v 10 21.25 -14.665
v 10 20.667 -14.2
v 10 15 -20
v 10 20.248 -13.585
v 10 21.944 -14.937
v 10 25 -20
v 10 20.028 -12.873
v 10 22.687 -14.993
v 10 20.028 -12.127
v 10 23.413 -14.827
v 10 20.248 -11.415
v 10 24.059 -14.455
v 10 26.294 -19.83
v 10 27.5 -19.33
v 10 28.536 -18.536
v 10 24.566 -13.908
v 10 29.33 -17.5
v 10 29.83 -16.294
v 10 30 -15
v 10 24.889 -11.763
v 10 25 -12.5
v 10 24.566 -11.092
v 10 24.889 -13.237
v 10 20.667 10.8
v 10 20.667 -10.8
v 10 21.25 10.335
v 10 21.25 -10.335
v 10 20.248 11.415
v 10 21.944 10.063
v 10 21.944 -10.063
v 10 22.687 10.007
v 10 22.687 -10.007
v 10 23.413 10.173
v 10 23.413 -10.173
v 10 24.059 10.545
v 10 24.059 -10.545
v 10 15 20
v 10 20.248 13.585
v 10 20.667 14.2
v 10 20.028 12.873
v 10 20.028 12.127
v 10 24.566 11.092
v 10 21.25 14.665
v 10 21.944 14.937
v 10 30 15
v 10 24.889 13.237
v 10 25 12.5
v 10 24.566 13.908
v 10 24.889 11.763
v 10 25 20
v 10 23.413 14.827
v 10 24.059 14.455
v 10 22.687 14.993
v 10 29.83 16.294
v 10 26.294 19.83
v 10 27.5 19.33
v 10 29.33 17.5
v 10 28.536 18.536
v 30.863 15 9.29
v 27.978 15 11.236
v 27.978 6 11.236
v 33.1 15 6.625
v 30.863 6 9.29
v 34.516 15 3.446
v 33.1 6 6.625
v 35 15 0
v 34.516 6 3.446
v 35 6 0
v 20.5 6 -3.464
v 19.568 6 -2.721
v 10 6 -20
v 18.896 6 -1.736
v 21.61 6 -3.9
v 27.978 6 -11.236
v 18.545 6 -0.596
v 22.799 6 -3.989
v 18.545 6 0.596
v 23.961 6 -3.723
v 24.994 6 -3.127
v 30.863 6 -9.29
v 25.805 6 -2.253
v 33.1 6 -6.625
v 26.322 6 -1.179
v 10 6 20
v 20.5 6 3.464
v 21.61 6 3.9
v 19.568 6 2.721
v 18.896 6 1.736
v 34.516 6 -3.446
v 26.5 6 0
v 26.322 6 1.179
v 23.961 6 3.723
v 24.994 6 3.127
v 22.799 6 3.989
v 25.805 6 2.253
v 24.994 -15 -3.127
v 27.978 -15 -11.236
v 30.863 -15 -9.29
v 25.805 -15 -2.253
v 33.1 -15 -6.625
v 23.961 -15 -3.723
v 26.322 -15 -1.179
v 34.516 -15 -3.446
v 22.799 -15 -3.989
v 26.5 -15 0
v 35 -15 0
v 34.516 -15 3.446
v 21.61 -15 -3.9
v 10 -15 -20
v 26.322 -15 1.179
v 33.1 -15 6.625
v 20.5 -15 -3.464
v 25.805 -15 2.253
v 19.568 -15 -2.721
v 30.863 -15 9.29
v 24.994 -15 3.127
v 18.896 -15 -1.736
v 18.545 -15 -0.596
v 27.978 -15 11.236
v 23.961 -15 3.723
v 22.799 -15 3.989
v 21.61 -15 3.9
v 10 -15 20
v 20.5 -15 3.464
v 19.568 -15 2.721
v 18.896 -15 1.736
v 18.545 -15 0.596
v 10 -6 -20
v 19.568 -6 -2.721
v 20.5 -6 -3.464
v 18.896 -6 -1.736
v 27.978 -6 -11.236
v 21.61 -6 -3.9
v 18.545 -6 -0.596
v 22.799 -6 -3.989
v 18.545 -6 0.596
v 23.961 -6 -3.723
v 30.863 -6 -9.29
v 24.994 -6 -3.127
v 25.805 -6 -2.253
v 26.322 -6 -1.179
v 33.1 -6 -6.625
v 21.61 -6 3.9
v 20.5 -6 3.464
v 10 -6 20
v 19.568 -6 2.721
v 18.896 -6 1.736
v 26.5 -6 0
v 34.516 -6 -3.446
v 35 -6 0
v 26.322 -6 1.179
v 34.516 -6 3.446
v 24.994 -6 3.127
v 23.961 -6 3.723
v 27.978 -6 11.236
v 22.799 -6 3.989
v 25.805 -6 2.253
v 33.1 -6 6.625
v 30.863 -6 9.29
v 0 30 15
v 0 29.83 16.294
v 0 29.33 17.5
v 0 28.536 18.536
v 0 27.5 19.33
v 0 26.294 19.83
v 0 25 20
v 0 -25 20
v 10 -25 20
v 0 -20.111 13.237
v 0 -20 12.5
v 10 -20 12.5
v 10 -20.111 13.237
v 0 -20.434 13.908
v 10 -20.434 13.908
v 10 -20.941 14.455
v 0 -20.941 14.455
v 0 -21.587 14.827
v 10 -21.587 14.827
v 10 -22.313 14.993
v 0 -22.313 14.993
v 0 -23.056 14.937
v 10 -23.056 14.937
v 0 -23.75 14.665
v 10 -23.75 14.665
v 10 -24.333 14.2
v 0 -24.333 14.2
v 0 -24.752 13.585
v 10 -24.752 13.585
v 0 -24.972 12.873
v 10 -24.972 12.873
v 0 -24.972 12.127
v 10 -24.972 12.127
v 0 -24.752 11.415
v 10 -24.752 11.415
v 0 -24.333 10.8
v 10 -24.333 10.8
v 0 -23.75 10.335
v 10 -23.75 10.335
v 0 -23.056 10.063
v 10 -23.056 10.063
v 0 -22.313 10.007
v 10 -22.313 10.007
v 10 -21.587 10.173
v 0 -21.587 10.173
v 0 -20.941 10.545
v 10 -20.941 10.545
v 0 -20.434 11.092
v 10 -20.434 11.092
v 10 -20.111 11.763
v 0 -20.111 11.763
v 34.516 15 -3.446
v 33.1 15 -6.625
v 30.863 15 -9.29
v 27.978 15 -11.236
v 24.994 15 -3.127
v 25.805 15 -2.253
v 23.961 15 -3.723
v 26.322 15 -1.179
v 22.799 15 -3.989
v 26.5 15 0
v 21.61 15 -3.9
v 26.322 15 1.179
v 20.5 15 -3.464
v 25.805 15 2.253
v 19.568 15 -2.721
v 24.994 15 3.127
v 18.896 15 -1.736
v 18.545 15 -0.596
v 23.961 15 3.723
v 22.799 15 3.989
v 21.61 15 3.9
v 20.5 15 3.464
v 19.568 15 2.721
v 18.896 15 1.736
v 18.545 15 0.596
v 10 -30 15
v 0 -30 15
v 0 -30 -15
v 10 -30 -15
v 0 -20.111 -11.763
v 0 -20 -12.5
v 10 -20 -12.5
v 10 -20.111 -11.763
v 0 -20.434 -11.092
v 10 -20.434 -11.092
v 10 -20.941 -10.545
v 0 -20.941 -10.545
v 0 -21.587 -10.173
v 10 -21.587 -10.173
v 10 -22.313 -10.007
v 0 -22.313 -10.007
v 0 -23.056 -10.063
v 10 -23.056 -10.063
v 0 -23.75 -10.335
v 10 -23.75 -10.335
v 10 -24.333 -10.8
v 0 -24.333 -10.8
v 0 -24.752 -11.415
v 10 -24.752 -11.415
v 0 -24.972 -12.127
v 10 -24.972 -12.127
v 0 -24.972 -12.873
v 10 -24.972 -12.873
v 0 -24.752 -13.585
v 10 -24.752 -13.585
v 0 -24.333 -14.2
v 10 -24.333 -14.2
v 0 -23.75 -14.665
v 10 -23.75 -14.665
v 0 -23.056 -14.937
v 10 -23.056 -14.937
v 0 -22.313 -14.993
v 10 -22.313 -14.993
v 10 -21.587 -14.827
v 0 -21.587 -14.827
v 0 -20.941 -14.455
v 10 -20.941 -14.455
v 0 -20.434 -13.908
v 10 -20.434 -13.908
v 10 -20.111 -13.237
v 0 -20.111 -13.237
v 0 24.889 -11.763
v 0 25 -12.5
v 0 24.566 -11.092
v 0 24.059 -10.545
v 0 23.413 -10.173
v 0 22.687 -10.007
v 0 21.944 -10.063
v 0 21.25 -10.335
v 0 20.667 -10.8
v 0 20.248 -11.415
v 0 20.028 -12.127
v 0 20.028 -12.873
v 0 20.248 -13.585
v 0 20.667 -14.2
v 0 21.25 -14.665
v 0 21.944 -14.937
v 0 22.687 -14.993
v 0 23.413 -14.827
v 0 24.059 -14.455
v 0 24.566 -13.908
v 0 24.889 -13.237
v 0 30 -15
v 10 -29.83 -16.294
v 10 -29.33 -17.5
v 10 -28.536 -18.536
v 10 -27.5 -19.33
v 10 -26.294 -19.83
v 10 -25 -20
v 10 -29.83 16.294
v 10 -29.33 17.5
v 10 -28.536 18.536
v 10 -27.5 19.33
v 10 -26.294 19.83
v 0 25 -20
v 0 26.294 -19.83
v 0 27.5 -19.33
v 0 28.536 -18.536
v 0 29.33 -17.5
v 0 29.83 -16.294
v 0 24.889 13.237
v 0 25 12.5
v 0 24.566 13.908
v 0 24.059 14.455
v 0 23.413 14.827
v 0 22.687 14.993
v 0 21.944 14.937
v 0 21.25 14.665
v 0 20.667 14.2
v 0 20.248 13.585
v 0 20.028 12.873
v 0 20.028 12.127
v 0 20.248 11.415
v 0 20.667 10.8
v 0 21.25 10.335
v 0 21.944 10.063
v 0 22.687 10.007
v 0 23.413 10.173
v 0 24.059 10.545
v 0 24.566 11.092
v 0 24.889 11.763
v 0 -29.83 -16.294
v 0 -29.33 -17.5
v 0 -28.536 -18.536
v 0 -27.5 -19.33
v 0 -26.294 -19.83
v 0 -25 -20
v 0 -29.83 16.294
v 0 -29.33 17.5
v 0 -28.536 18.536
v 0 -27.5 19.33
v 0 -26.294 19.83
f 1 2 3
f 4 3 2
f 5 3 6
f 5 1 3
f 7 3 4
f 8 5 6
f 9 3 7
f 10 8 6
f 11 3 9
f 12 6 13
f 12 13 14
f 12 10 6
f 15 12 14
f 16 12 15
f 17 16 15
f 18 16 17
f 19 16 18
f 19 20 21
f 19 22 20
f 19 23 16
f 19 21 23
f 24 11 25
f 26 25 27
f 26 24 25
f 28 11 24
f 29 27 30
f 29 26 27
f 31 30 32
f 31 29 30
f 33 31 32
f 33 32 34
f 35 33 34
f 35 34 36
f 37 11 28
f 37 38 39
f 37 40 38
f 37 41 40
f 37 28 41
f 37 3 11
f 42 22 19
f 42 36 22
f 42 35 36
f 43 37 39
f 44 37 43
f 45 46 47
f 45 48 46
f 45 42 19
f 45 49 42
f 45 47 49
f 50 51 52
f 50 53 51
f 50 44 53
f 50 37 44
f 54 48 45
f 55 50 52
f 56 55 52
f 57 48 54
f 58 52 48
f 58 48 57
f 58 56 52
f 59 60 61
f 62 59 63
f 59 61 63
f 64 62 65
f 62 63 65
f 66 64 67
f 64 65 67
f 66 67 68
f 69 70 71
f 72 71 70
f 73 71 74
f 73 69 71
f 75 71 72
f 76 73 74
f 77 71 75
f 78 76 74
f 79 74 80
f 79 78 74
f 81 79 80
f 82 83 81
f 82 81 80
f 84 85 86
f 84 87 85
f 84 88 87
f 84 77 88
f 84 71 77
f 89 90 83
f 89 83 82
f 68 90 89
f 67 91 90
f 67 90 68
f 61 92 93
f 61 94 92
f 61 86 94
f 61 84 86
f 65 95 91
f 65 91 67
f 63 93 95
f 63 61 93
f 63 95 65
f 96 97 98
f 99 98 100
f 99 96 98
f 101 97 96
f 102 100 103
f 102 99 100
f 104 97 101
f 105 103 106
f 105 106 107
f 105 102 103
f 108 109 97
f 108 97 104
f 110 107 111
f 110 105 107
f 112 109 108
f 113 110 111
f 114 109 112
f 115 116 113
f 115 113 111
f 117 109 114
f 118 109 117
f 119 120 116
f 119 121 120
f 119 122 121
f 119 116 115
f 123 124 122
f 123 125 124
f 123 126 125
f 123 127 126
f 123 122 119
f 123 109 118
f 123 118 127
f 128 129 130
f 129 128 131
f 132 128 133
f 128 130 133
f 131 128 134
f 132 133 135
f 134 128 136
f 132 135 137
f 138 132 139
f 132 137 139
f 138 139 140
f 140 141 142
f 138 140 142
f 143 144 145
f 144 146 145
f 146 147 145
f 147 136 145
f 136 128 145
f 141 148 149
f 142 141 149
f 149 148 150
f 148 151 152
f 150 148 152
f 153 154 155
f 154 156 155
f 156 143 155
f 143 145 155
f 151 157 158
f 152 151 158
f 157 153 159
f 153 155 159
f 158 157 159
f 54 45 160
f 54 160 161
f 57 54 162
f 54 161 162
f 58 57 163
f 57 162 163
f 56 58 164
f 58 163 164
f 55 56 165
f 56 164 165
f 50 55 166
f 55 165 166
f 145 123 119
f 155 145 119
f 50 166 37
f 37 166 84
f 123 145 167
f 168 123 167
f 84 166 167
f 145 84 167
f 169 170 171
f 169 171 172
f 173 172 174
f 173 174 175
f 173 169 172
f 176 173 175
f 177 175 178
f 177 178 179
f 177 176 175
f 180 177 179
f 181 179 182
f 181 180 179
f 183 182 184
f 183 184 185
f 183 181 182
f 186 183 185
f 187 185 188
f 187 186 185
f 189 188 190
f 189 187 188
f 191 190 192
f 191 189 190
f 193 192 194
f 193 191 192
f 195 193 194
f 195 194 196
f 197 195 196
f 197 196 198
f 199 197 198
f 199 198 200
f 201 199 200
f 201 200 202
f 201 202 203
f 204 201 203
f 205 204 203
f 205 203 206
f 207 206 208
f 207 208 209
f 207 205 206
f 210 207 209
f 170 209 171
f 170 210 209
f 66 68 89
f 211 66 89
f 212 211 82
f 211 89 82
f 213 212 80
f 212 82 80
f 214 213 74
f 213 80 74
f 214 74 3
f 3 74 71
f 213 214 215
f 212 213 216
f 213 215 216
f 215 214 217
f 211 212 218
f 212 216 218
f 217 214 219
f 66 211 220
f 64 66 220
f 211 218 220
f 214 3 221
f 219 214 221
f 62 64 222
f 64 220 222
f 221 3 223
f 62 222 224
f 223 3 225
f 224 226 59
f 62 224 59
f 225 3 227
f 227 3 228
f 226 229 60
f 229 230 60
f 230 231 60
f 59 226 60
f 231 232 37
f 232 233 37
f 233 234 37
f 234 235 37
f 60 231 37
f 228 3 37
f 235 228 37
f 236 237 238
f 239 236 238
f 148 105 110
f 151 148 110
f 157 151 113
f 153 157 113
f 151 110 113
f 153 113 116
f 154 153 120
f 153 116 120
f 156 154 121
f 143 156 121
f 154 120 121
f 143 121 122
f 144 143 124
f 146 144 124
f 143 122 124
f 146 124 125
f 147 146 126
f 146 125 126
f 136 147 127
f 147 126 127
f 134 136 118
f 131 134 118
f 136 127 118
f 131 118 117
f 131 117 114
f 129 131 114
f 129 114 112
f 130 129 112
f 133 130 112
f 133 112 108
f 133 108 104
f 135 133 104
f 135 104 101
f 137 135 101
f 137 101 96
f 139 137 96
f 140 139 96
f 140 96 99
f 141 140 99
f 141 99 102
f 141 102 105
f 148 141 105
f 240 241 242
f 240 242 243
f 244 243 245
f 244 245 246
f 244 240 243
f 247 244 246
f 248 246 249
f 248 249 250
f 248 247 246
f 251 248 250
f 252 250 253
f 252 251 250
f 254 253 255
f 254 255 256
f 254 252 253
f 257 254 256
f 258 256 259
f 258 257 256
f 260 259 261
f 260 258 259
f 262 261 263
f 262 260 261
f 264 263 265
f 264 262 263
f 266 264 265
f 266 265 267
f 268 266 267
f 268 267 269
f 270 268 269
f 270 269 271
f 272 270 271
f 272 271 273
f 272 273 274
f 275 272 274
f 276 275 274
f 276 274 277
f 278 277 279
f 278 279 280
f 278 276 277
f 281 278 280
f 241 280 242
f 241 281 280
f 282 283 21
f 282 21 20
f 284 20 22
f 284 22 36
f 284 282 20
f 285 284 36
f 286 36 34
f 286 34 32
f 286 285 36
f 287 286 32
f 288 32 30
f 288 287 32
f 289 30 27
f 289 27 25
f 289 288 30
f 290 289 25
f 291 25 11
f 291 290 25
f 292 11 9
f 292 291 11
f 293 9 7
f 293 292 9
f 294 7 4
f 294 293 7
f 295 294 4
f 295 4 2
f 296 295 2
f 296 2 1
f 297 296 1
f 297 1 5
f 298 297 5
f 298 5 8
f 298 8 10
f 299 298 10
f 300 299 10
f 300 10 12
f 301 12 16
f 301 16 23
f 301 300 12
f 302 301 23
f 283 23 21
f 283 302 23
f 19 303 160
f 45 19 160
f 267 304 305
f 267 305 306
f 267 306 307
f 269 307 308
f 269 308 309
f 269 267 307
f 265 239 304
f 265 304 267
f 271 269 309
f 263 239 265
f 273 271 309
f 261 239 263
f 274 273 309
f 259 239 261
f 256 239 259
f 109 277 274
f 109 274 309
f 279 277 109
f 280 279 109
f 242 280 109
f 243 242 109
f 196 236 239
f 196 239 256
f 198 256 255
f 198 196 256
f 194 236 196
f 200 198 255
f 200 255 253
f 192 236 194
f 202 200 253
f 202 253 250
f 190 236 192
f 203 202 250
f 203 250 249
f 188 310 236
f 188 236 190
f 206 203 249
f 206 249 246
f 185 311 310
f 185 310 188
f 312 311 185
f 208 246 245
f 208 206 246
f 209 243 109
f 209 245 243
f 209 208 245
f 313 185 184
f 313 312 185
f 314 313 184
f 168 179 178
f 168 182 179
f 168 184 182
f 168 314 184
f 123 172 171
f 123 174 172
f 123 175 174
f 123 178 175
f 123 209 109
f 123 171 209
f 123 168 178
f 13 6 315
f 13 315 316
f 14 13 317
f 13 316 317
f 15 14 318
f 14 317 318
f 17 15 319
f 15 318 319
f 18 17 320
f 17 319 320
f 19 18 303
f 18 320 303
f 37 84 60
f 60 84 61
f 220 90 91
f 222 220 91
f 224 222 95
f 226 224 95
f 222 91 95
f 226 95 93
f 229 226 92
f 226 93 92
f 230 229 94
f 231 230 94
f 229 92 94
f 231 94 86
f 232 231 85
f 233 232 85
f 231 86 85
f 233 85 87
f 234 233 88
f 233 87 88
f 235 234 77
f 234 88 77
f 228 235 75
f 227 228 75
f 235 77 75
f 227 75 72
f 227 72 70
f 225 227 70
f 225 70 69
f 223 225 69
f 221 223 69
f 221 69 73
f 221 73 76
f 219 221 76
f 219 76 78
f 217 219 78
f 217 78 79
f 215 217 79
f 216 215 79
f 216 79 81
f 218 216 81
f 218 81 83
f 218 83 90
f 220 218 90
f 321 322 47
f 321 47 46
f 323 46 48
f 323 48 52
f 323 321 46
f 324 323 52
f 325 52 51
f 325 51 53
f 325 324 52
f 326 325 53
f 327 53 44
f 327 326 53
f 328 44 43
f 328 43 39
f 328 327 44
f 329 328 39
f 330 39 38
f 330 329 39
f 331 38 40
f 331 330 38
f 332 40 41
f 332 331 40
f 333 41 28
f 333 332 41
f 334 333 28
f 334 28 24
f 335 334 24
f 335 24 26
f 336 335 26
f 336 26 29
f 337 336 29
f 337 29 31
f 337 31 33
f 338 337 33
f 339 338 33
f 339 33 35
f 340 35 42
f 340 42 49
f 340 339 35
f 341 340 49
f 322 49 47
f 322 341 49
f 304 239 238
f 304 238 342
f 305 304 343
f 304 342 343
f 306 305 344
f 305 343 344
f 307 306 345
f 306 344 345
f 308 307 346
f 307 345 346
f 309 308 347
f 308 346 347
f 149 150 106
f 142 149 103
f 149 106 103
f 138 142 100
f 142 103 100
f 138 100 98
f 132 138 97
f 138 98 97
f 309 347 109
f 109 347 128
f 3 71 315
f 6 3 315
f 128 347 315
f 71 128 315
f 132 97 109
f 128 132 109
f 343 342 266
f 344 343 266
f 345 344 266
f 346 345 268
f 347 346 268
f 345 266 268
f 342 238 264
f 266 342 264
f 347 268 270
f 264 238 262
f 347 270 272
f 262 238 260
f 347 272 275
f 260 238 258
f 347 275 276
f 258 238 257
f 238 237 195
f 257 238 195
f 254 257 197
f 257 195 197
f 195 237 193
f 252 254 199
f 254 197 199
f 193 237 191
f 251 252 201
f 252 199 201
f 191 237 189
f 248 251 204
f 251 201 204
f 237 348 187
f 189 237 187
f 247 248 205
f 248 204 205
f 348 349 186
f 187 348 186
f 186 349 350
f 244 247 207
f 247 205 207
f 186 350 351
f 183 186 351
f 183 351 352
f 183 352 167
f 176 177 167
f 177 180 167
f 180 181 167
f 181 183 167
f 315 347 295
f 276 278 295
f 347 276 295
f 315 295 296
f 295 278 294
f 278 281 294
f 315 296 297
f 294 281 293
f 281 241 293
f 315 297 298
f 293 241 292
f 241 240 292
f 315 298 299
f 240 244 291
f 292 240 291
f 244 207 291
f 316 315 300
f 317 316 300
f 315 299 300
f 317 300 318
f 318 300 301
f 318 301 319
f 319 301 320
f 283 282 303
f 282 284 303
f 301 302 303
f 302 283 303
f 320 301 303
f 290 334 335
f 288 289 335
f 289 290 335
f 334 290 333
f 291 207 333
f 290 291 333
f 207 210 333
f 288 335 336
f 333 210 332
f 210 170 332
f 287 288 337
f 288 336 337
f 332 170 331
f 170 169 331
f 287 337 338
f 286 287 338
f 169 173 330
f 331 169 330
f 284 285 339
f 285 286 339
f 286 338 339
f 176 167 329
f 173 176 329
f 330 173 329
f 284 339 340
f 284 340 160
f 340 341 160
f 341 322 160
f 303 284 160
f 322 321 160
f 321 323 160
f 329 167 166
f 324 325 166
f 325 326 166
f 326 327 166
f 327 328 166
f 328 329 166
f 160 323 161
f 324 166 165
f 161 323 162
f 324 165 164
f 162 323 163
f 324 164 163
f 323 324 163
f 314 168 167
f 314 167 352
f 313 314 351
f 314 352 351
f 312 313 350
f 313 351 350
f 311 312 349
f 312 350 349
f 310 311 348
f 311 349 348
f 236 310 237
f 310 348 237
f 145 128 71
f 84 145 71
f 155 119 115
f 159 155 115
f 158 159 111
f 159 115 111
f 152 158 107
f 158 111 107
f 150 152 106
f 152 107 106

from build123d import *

# Parameters (mm, degrees)
F0_R     = 2.5
F1_DEPTH = 10
F2_W     = 30
F2_H     = 40
F3_DEPTH = 25
F4_R     = 4
F5_DEPTH = 30
F6_W     = 30
F6_H     = 12
F7_DEPTH = 40.001


with BuildPart() as f1:
    # F0 (on Right) → F1 (new body)
    with BuildSketch(Plane.YZ):
        with BuildLine():
            Line((25, 20), (-25, 20))
            ThreePointArc((-25, 20), (-28.535534, 18.535534), (-30, 15))
            Line((-30, 15), (-30, -15))
            ThreePointArc((-30, -15), (-28.535534, -18.535534), (-25, -20))
            Line((-25, -20), (25, -20))
            ThreePointArc((25, -20), (28.535534, -18.535534), (30, -15))
            Line((30, -15), (30, 15))
            ThreePointArc((30, 15), (28.535534, 18.535534), (25, 20))
        make_face()
        with Locations((-22.5, -12.5)):
            Circle(F0_R, mode=Mode.SUBTRACT)
        with Locations((22.5, -12.5)):
            Circle(F0_R, mode=Mode.SUBTRACT)
        with Locations((-22.5, 12.5)):
            Circle(F0_R, mode=Mode.SUBTRACT)
        with Locations((22.5, 12.5)):
            Circle(F0_R, mode=Mode.SUBTRACT)
    extrude(amount=F1_DEPTH)

    # F2 (on face) → F3 (join)
    with BuildSketch(Plane.YZ.offset(10)):
        Rectangle(F2_W, F2_H)
    extrude(amount=F3_DEPTH)

    # F4 (on face) → F5 (cut)
    with BuildSketch(Plane.XZ.offset(15)):
        with BuildLine():
            ThreePointArc((27.977528, 11.235955), (33.099979, 6.624987), (35, 0))
            Line((35, 0), (35, 20))
            Line((35, 20), (10, 20))
            Line((10, 20), (27.977528, 11.235955))
        make_face()
        with BuildLine():
            ThreePointArc((35, 0), (33.099979, -6.624987), (27.977528, -11.235955))
            Line((27.977528, -11.235955), (10, -20))
            Line((10, -20), (35, -20))
            Line((35, -20), (35, 0))
        make_face()
        with Locations((22.5, 0)):
            Circle(F4_R)
    extrude(amount=-F5_DEPTH, mode=Mode.SUBTRACT)

    # F6 (on face) → F7 (cut, through all)
    with BuildSketch(Plane.XY.offset(20)):
        with Locations((25, 0)):
            Rectangle(F6_W, F6_H)
    extrude(amount=-F7_DEPTH, mode=Mode.SUBTRACT)


solid = f1.part
